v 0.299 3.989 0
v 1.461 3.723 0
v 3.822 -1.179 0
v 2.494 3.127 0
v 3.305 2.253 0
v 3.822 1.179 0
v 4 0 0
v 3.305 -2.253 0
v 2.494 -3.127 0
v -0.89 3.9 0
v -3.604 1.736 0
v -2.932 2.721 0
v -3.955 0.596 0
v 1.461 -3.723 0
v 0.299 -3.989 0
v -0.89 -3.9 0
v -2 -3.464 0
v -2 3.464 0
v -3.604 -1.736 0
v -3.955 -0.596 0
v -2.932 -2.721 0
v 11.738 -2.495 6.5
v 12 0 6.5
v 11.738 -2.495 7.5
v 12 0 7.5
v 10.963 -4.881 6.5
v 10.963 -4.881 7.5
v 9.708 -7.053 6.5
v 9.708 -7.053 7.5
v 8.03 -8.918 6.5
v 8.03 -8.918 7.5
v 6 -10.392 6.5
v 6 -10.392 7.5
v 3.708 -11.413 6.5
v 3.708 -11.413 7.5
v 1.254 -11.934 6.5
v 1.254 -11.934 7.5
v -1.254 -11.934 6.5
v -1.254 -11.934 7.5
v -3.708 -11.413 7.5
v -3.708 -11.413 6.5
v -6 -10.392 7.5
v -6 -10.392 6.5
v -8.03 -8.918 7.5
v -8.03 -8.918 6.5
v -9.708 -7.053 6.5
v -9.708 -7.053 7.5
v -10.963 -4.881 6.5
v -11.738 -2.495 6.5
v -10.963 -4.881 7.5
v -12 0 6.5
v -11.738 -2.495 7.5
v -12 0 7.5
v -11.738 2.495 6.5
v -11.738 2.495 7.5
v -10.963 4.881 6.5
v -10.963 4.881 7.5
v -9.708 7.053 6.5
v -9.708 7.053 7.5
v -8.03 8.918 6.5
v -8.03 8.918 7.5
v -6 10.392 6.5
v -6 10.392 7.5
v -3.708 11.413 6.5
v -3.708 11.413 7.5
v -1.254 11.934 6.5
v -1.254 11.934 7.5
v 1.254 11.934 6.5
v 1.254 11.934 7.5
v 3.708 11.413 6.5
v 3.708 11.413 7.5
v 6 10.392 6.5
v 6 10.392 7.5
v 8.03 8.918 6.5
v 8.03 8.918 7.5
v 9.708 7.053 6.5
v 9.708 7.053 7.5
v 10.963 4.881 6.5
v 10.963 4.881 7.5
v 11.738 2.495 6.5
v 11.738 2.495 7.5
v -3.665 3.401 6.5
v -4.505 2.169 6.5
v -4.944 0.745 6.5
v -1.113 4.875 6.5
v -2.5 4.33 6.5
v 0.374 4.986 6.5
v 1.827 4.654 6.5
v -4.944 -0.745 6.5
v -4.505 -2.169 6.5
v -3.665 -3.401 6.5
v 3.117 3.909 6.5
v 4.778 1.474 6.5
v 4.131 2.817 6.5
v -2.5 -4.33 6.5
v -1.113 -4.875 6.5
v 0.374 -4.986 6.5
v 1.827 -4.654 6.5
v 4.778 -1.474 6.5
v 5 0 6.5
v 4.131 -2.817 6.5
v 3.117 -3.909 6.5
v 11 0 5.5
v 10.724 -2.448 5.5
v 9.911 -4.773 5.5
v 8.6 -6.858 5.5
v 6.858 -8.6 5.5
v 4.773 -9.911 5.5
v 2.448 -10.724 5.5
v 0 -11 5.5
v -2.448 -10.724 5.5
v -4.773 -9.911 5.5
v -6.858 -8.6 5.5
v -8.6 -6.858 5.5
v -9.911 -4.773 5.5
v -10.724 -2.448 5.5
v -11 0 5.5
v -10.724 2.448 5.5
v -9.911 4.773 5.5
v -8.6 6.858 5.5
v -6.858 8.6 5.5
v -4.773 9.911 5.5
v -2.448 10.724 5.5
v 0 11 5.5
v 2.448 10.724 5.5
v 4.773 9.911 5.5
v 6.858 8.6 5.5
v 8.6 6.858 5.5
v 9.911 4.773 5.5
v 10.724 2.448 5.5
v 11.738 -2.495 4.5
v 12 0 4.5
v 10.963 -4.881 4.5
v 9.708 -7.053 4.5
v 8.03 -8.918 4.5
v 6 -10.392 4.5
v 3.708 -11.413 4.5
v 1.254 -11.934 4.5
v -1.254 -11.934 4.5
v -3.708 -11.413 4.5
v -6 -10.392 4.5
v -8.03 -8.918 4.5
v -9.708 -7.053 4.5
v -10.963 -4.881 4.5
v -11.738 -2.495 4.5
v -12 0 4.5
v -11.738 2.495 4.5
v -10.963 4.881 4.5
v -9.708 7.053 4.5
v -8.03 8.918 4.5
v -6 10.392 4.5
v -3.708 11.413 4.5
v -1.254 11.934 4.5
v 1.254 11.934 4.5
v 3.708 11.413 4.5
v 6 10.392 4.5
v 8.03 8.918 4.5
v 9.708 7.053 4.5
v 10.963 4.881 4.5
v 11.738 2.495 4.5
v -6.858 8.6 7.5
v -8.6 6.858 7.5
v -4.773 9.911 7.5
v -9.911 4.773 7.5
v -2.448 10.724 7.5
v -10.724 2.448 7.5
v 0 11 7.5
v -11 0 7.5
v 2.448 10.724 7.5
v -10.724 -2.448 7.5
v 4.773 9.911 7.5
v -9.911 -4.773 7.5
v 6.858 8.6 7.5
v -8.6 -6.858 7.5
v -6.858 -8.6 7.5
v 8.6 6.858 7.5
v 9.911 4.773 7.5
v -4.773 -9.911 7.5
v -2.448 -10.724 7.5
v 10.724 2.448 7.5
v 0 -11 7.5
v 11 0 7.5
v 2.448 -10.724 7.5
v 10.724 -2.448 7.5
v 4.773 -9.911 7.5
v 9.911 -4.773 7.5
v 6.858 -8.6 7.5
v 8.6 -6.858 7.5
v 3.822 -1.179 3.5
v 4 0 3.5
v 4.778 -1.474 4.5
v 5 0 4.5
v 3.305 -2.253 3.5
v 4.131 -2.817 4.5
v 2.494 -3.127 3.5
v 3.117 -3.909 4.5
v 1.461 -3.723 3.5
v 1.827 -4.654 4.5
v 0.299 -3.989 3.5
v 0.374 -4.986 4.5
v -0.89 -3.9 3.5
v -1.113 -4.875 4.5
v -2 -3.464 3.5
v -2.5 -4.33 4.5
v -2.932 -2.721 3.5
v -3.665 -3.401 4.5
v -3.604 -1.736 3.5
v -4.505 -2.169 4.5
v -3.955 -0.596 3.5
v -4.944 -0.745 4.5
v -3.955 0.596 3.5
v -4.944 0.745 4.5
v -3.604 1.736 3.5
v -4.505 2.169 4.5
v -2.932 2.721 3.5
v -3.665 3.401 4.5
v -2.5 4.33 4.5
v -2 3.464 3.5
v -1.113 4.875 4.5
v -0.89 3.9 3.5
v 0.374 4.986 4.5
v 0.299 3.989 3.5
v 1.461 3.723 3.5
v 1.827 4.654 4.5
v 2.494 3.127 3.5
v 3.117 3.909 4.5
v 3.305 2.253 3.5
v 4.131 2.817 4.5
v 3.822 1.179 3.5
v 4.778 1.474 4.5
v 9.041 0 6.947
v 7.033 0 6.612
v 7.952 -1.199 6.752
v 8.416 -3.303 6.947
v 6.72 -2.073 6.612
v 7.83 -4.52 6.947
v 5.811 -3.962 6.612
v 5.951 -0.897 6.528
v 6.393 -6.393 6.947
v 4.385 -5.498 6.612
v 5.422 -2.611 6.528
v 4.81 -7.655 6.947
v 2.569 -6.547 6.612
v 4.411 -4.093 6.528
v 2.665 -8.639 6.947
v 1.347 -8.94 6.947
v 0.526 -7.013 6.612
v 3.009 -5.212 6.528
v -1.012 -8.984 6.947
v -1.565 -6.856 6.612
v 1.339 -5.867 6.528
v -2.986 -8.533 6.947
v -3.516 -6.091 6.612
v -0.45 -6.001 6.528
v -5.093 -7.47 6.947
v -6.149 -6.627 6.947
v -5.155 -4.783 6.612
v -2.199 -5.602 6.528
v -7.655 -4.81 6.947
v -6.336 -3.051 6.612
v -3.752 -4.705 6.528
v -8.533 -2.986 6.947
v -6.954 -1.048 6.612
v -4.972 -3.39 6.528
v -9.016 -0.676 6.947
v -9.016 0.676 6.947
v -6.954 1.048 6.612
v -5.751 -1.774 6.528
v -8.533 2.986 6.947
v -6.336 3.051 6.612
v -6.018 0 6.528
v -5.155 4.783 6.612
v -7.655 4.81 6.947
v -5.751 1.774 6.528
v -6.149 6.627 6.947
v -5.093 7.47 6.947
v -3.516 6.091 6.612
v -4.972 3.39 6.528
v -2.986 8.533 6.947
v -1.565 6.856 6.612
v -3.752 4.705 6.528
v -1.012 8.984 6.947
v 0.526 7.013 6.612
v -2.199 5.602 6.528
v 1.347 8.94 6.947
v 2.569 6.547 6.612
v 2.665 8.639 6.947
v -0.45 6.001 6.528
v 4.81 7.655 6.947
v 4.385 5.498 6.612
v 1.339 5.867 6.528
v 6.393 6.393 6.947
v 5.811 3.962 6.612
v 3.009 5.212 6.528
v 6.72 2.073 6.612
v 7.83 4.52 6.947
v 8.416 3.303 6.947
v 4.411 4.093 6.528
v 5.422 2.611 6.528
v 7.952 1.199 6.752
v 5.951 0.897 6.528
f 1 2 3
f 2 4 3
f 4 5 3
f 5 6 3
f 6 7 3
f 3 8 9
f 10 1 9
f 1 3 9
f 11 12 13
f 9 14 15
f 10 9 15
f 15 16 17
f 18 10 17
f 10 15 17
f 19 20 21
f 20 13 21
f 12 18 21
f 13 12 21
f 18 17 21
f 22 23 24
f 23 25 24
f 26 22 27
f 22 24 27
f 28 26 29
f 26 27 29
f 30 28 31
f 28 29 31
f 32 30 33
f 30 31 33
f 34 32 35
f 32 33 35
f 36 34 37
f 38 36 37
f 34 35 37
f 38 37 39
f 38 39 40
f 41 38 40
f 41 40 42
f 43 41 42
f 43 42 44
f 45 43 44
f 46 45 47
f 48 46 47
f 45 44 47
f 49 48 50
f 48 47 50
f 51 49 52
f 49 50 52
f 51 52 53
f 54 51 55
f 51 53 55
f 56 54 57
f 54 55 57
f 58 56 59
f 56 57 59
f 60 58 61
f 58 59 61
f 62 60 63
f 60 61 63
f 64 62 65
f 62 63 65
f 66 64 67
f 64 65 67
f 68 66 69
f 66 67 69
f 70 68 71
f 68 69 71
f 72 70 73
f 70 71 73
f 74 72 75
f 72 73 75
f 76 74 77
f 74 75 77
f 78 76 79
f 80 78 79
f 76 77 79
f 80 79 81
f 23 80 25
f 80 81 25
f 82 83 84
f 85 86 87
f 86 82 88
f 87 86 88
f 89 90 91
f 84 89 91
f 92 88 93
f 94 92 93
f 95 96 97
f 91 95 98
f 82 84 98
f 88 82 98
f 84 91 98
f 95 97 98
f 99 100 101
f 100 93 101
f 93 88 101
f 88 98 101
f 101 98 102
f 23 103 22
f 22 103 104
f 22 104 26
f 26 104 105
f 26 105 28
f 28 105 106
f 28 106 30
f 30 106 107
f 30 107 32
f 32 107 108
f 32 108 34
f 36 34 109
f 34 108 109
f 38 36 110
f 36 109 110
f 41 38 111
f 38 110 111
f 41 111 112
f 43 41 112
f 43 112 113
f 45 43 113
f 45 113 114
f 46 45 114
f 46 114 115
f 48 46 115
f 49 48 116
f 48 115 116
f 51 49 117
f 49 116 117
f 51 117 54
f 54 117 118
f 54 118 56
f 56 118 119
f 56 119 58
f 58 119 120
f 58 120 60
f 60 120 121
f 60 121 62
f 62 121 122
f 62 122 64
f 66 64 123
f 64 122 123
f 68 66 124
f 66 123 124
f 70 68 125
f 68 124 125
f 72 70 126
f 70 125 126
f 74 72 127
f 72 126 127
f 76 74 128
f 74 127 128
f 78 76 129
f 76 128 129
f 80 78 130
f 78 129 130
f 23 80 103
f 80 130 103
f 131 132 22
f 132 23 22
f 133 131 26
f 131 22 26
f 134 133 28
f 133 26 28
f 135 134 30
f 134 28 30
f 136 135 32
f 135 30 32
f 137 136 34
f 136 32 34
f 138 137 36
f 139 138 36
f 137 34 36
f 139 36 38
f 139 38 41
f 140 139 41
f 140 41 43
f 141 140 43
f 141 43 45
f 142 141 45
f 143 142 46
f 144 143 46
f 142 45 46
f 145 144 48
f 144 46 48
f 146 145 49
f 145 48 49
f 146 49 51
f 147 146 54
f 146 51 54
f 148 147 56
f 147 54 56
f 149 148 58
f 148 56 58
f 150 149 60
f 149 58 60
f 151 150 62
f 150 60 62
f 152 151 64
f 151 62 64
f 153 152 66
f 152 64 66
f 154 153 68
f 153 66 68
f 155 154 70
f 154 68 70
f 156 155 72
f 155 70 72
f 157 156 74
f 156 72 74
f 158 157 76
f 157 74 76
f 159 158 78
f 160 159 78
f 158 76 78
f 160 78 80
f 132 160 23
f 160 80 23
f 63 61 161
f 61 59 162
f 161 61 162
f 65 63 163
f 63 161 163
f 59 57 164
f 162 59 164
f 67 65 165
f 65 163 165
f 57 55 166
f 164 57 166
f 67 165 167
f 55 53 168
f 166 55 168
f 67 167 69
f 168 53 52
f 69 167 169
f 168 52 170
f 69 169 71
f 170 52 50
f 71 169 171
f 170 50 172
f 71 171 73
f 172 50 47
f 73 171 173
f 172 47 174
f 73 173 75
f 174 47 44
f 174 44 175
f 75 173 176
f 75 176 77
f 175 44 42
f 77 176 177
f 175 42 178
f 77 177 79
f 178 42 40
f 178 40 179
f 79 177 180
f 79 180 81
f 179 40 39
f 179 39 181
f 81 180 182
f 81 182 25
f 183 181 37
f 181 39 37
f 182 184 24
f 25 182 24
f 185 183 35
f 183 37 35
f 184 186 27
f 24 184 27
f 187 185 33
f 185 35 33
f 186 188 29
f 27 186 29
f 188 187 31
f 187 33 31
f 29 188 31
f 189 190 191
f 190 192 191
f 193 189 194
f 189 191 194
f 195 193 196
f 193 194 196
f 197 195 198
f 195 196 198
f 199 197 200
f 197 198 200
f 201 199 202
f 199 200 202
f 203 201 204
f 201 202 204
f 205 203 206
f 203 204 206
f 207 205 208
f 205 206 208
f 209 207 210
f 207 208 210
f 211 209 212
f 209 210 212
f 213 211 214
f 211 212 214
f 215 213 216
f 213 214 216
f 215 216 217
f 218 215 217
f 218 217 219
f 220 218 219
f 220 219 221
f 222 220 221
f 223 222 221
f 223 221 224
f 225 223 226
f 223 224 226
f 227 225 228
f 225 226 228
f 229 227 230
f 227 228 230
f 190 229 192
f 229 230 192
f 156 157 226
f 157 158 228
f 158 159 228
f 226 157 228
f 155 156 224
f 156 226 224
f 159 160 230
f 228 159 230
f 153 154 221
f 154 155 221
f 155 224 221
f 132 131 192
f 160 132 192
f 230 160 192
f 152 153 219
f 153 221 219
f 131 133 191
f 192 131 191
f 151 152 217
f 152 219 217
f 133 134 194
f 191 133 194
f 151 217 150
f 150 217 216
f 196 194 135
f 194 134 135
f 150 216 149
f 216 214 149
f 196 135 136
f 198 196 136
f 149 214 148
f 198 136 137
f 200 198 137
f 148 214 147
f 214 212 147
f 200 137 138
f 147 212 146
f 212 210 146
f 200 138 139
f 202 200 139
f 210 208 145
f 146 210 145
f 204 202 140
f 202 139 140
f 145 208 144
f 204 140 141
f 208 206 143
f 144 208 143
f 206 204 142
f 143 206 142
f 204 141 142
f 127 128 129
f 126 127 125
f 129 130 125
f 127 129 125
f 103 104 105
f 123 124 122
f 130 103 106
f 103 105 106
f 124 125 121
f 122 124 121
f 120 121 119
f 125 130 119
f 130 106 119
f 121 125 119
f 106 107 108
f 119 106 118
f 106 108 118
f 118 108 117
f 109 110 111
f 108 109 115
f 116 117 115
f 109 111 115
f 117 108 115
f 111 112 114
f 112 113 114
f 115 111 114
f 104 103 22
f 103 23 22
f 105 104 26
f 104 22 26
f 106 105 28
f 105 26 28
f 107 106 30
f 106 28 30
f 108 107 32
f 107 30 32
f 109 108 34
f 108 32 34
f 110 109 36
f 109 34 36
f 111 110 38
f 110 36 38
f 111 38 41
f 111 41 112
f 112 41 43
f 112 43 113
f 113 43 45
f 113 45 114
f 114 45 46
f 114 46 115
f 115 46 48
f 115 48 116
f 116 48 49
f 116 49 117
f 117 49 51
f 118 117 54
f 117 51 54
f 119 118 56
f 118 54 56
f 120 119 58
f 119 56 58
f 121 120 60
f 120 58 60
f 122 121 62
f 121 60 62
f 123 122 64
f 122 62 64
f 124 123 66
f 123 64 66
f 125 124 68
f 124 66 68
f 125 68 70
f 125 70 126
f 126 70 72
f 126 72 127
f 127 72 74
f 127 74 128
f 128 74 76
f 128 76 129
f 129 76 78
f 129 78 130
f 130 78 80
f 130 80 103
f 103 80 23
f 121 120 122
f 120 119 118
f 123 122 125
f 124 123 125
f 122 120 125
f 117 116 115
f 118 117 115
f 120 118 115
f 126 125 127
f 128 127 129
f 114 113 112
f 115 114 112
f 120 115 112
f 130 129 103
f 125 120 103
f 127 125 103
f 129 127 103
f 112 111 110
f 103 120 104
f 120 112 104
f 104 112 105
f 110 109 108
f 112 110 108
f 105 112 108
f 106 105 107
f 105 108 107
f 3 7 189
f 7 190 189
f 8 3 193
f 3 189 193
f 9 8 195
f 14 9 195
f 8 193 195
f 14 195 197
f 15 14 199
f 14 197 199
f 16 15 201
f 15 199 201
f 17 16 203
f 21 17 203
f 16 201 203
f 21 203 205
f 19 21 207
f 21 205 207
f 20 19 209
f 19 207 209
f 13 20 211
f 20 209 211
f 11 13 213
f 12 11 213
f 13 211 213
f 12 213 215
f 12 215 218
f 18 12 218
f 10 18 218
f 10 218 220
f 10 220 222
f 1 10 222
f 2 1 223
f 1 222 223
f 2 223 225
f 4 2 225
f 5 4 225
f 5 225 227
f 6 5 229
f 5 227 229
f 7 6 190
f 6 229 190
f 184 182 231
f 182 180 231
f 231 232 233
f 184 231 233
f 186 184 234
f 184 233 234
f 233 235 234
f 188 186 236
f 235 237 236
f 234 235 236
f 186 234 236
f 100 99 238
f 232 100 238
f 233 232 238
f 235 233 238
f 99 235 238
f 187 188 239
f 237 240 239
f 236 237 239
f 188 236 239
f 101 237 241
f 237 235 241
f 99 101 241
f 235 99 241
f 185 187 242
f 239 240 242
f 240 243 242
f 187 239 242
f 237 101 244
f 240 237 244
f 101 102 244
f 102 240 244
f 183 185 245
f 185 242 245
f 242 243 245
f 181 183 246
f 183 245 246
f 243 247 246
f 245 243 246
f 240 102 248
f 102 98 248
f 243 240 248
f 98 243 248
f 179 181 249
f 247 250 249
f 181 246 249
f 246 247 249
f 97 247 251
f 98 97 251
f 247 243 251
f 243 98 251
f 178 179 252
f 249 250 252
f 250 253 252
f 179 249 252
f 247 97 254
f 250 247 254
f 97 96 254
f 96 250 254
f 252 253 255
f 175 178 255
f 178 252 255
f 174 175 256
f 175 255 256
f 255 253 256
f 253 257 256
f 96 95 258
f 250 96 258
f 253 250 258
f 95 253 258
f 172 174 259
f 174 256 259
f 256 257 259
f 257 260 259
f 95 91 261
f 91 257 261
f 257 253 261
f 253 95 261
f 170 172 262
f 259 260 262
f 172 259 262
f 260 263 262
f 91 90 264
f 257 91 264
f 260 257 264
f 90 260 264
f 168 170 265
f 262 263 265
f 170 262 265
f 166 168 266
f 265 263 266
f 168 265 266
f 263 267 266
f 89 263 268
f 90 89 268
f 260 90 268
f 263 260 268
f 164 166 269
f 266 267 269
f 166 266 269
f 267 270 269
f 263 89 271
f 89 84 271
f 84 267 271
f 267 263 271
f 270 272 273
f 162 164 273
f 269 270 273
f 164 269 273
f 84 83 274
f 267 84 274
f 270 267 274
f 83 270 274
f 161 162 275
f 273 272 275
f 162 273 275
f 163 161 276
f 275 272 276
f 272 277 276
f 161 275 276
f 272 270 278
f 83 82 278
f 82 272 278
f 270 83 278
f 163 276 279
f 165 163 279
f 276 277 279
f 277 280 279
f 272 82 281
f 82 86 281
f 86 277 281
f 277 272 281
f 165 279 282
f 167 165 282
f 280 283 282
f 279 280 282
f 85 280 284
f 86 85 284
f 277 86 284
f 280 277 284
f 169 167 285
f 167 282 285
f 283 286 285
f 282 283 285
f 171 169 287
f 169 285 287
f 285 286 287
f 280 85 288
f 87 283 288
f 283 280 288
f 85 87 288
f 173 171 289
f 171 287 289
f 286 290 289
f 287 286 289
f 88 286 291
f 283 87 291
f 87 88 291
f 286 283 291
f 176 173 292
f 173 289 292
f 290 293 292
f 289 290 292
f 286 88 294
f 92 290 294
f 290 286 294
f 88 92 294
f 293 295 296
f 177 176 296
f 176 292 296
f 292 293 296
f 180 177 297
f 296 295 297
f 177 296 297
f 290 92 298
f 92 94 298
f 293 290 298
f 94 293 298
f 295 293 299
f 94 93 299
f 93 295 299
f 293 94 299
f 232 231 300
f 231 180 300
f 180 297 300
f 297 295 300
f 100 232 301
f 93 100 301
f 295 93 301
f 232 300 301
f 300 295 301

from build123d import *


# Not quite as in the source:
# - a feature of the source that left no trace in its solid (it failed there, or was rolled back) is left out
# - a feature names something its author has since deleted; it is built from what else it names


with BuildPart() as f1:
    # F0 (on Front) → F1 (revolve)
    with BuildSketch(Plane.XZ):
        Polygon((0, 5.5), (0, 0), (4, 0), (4, 3.5), (5, 4.5), (12, 4.5), (12, 6.5), (11, 5.5), align=None)
    revolve(axis=Axis((0, 0, 2.75), (0, 0, -1)))


with BuildPart() as f2:
    # F0 (on Front) → F2 (revolve)
    with BuildSketch(Plane.XZ):
        with BuildLine():
            Line((0, 6.5), (0, 5.5))
            Line((0, 5.5), (11, 5.5))
            Line((11, 5.5), (12, 6.5))
            Line((12, 6.5), (12, 7.5))
            Line((12, 7.5), (11, 7.5))
            ThreePointArc((11, 7.5), (8.0413812651, 6.7517124091), (5, 6.5))
            Line((5, 6.5), (0, 6.5))
        make_face()
    revolve(axis=Axis((0, 0, 2.75), (0, 0, -1)))


solid = Compound([f1.part, f2.part])
